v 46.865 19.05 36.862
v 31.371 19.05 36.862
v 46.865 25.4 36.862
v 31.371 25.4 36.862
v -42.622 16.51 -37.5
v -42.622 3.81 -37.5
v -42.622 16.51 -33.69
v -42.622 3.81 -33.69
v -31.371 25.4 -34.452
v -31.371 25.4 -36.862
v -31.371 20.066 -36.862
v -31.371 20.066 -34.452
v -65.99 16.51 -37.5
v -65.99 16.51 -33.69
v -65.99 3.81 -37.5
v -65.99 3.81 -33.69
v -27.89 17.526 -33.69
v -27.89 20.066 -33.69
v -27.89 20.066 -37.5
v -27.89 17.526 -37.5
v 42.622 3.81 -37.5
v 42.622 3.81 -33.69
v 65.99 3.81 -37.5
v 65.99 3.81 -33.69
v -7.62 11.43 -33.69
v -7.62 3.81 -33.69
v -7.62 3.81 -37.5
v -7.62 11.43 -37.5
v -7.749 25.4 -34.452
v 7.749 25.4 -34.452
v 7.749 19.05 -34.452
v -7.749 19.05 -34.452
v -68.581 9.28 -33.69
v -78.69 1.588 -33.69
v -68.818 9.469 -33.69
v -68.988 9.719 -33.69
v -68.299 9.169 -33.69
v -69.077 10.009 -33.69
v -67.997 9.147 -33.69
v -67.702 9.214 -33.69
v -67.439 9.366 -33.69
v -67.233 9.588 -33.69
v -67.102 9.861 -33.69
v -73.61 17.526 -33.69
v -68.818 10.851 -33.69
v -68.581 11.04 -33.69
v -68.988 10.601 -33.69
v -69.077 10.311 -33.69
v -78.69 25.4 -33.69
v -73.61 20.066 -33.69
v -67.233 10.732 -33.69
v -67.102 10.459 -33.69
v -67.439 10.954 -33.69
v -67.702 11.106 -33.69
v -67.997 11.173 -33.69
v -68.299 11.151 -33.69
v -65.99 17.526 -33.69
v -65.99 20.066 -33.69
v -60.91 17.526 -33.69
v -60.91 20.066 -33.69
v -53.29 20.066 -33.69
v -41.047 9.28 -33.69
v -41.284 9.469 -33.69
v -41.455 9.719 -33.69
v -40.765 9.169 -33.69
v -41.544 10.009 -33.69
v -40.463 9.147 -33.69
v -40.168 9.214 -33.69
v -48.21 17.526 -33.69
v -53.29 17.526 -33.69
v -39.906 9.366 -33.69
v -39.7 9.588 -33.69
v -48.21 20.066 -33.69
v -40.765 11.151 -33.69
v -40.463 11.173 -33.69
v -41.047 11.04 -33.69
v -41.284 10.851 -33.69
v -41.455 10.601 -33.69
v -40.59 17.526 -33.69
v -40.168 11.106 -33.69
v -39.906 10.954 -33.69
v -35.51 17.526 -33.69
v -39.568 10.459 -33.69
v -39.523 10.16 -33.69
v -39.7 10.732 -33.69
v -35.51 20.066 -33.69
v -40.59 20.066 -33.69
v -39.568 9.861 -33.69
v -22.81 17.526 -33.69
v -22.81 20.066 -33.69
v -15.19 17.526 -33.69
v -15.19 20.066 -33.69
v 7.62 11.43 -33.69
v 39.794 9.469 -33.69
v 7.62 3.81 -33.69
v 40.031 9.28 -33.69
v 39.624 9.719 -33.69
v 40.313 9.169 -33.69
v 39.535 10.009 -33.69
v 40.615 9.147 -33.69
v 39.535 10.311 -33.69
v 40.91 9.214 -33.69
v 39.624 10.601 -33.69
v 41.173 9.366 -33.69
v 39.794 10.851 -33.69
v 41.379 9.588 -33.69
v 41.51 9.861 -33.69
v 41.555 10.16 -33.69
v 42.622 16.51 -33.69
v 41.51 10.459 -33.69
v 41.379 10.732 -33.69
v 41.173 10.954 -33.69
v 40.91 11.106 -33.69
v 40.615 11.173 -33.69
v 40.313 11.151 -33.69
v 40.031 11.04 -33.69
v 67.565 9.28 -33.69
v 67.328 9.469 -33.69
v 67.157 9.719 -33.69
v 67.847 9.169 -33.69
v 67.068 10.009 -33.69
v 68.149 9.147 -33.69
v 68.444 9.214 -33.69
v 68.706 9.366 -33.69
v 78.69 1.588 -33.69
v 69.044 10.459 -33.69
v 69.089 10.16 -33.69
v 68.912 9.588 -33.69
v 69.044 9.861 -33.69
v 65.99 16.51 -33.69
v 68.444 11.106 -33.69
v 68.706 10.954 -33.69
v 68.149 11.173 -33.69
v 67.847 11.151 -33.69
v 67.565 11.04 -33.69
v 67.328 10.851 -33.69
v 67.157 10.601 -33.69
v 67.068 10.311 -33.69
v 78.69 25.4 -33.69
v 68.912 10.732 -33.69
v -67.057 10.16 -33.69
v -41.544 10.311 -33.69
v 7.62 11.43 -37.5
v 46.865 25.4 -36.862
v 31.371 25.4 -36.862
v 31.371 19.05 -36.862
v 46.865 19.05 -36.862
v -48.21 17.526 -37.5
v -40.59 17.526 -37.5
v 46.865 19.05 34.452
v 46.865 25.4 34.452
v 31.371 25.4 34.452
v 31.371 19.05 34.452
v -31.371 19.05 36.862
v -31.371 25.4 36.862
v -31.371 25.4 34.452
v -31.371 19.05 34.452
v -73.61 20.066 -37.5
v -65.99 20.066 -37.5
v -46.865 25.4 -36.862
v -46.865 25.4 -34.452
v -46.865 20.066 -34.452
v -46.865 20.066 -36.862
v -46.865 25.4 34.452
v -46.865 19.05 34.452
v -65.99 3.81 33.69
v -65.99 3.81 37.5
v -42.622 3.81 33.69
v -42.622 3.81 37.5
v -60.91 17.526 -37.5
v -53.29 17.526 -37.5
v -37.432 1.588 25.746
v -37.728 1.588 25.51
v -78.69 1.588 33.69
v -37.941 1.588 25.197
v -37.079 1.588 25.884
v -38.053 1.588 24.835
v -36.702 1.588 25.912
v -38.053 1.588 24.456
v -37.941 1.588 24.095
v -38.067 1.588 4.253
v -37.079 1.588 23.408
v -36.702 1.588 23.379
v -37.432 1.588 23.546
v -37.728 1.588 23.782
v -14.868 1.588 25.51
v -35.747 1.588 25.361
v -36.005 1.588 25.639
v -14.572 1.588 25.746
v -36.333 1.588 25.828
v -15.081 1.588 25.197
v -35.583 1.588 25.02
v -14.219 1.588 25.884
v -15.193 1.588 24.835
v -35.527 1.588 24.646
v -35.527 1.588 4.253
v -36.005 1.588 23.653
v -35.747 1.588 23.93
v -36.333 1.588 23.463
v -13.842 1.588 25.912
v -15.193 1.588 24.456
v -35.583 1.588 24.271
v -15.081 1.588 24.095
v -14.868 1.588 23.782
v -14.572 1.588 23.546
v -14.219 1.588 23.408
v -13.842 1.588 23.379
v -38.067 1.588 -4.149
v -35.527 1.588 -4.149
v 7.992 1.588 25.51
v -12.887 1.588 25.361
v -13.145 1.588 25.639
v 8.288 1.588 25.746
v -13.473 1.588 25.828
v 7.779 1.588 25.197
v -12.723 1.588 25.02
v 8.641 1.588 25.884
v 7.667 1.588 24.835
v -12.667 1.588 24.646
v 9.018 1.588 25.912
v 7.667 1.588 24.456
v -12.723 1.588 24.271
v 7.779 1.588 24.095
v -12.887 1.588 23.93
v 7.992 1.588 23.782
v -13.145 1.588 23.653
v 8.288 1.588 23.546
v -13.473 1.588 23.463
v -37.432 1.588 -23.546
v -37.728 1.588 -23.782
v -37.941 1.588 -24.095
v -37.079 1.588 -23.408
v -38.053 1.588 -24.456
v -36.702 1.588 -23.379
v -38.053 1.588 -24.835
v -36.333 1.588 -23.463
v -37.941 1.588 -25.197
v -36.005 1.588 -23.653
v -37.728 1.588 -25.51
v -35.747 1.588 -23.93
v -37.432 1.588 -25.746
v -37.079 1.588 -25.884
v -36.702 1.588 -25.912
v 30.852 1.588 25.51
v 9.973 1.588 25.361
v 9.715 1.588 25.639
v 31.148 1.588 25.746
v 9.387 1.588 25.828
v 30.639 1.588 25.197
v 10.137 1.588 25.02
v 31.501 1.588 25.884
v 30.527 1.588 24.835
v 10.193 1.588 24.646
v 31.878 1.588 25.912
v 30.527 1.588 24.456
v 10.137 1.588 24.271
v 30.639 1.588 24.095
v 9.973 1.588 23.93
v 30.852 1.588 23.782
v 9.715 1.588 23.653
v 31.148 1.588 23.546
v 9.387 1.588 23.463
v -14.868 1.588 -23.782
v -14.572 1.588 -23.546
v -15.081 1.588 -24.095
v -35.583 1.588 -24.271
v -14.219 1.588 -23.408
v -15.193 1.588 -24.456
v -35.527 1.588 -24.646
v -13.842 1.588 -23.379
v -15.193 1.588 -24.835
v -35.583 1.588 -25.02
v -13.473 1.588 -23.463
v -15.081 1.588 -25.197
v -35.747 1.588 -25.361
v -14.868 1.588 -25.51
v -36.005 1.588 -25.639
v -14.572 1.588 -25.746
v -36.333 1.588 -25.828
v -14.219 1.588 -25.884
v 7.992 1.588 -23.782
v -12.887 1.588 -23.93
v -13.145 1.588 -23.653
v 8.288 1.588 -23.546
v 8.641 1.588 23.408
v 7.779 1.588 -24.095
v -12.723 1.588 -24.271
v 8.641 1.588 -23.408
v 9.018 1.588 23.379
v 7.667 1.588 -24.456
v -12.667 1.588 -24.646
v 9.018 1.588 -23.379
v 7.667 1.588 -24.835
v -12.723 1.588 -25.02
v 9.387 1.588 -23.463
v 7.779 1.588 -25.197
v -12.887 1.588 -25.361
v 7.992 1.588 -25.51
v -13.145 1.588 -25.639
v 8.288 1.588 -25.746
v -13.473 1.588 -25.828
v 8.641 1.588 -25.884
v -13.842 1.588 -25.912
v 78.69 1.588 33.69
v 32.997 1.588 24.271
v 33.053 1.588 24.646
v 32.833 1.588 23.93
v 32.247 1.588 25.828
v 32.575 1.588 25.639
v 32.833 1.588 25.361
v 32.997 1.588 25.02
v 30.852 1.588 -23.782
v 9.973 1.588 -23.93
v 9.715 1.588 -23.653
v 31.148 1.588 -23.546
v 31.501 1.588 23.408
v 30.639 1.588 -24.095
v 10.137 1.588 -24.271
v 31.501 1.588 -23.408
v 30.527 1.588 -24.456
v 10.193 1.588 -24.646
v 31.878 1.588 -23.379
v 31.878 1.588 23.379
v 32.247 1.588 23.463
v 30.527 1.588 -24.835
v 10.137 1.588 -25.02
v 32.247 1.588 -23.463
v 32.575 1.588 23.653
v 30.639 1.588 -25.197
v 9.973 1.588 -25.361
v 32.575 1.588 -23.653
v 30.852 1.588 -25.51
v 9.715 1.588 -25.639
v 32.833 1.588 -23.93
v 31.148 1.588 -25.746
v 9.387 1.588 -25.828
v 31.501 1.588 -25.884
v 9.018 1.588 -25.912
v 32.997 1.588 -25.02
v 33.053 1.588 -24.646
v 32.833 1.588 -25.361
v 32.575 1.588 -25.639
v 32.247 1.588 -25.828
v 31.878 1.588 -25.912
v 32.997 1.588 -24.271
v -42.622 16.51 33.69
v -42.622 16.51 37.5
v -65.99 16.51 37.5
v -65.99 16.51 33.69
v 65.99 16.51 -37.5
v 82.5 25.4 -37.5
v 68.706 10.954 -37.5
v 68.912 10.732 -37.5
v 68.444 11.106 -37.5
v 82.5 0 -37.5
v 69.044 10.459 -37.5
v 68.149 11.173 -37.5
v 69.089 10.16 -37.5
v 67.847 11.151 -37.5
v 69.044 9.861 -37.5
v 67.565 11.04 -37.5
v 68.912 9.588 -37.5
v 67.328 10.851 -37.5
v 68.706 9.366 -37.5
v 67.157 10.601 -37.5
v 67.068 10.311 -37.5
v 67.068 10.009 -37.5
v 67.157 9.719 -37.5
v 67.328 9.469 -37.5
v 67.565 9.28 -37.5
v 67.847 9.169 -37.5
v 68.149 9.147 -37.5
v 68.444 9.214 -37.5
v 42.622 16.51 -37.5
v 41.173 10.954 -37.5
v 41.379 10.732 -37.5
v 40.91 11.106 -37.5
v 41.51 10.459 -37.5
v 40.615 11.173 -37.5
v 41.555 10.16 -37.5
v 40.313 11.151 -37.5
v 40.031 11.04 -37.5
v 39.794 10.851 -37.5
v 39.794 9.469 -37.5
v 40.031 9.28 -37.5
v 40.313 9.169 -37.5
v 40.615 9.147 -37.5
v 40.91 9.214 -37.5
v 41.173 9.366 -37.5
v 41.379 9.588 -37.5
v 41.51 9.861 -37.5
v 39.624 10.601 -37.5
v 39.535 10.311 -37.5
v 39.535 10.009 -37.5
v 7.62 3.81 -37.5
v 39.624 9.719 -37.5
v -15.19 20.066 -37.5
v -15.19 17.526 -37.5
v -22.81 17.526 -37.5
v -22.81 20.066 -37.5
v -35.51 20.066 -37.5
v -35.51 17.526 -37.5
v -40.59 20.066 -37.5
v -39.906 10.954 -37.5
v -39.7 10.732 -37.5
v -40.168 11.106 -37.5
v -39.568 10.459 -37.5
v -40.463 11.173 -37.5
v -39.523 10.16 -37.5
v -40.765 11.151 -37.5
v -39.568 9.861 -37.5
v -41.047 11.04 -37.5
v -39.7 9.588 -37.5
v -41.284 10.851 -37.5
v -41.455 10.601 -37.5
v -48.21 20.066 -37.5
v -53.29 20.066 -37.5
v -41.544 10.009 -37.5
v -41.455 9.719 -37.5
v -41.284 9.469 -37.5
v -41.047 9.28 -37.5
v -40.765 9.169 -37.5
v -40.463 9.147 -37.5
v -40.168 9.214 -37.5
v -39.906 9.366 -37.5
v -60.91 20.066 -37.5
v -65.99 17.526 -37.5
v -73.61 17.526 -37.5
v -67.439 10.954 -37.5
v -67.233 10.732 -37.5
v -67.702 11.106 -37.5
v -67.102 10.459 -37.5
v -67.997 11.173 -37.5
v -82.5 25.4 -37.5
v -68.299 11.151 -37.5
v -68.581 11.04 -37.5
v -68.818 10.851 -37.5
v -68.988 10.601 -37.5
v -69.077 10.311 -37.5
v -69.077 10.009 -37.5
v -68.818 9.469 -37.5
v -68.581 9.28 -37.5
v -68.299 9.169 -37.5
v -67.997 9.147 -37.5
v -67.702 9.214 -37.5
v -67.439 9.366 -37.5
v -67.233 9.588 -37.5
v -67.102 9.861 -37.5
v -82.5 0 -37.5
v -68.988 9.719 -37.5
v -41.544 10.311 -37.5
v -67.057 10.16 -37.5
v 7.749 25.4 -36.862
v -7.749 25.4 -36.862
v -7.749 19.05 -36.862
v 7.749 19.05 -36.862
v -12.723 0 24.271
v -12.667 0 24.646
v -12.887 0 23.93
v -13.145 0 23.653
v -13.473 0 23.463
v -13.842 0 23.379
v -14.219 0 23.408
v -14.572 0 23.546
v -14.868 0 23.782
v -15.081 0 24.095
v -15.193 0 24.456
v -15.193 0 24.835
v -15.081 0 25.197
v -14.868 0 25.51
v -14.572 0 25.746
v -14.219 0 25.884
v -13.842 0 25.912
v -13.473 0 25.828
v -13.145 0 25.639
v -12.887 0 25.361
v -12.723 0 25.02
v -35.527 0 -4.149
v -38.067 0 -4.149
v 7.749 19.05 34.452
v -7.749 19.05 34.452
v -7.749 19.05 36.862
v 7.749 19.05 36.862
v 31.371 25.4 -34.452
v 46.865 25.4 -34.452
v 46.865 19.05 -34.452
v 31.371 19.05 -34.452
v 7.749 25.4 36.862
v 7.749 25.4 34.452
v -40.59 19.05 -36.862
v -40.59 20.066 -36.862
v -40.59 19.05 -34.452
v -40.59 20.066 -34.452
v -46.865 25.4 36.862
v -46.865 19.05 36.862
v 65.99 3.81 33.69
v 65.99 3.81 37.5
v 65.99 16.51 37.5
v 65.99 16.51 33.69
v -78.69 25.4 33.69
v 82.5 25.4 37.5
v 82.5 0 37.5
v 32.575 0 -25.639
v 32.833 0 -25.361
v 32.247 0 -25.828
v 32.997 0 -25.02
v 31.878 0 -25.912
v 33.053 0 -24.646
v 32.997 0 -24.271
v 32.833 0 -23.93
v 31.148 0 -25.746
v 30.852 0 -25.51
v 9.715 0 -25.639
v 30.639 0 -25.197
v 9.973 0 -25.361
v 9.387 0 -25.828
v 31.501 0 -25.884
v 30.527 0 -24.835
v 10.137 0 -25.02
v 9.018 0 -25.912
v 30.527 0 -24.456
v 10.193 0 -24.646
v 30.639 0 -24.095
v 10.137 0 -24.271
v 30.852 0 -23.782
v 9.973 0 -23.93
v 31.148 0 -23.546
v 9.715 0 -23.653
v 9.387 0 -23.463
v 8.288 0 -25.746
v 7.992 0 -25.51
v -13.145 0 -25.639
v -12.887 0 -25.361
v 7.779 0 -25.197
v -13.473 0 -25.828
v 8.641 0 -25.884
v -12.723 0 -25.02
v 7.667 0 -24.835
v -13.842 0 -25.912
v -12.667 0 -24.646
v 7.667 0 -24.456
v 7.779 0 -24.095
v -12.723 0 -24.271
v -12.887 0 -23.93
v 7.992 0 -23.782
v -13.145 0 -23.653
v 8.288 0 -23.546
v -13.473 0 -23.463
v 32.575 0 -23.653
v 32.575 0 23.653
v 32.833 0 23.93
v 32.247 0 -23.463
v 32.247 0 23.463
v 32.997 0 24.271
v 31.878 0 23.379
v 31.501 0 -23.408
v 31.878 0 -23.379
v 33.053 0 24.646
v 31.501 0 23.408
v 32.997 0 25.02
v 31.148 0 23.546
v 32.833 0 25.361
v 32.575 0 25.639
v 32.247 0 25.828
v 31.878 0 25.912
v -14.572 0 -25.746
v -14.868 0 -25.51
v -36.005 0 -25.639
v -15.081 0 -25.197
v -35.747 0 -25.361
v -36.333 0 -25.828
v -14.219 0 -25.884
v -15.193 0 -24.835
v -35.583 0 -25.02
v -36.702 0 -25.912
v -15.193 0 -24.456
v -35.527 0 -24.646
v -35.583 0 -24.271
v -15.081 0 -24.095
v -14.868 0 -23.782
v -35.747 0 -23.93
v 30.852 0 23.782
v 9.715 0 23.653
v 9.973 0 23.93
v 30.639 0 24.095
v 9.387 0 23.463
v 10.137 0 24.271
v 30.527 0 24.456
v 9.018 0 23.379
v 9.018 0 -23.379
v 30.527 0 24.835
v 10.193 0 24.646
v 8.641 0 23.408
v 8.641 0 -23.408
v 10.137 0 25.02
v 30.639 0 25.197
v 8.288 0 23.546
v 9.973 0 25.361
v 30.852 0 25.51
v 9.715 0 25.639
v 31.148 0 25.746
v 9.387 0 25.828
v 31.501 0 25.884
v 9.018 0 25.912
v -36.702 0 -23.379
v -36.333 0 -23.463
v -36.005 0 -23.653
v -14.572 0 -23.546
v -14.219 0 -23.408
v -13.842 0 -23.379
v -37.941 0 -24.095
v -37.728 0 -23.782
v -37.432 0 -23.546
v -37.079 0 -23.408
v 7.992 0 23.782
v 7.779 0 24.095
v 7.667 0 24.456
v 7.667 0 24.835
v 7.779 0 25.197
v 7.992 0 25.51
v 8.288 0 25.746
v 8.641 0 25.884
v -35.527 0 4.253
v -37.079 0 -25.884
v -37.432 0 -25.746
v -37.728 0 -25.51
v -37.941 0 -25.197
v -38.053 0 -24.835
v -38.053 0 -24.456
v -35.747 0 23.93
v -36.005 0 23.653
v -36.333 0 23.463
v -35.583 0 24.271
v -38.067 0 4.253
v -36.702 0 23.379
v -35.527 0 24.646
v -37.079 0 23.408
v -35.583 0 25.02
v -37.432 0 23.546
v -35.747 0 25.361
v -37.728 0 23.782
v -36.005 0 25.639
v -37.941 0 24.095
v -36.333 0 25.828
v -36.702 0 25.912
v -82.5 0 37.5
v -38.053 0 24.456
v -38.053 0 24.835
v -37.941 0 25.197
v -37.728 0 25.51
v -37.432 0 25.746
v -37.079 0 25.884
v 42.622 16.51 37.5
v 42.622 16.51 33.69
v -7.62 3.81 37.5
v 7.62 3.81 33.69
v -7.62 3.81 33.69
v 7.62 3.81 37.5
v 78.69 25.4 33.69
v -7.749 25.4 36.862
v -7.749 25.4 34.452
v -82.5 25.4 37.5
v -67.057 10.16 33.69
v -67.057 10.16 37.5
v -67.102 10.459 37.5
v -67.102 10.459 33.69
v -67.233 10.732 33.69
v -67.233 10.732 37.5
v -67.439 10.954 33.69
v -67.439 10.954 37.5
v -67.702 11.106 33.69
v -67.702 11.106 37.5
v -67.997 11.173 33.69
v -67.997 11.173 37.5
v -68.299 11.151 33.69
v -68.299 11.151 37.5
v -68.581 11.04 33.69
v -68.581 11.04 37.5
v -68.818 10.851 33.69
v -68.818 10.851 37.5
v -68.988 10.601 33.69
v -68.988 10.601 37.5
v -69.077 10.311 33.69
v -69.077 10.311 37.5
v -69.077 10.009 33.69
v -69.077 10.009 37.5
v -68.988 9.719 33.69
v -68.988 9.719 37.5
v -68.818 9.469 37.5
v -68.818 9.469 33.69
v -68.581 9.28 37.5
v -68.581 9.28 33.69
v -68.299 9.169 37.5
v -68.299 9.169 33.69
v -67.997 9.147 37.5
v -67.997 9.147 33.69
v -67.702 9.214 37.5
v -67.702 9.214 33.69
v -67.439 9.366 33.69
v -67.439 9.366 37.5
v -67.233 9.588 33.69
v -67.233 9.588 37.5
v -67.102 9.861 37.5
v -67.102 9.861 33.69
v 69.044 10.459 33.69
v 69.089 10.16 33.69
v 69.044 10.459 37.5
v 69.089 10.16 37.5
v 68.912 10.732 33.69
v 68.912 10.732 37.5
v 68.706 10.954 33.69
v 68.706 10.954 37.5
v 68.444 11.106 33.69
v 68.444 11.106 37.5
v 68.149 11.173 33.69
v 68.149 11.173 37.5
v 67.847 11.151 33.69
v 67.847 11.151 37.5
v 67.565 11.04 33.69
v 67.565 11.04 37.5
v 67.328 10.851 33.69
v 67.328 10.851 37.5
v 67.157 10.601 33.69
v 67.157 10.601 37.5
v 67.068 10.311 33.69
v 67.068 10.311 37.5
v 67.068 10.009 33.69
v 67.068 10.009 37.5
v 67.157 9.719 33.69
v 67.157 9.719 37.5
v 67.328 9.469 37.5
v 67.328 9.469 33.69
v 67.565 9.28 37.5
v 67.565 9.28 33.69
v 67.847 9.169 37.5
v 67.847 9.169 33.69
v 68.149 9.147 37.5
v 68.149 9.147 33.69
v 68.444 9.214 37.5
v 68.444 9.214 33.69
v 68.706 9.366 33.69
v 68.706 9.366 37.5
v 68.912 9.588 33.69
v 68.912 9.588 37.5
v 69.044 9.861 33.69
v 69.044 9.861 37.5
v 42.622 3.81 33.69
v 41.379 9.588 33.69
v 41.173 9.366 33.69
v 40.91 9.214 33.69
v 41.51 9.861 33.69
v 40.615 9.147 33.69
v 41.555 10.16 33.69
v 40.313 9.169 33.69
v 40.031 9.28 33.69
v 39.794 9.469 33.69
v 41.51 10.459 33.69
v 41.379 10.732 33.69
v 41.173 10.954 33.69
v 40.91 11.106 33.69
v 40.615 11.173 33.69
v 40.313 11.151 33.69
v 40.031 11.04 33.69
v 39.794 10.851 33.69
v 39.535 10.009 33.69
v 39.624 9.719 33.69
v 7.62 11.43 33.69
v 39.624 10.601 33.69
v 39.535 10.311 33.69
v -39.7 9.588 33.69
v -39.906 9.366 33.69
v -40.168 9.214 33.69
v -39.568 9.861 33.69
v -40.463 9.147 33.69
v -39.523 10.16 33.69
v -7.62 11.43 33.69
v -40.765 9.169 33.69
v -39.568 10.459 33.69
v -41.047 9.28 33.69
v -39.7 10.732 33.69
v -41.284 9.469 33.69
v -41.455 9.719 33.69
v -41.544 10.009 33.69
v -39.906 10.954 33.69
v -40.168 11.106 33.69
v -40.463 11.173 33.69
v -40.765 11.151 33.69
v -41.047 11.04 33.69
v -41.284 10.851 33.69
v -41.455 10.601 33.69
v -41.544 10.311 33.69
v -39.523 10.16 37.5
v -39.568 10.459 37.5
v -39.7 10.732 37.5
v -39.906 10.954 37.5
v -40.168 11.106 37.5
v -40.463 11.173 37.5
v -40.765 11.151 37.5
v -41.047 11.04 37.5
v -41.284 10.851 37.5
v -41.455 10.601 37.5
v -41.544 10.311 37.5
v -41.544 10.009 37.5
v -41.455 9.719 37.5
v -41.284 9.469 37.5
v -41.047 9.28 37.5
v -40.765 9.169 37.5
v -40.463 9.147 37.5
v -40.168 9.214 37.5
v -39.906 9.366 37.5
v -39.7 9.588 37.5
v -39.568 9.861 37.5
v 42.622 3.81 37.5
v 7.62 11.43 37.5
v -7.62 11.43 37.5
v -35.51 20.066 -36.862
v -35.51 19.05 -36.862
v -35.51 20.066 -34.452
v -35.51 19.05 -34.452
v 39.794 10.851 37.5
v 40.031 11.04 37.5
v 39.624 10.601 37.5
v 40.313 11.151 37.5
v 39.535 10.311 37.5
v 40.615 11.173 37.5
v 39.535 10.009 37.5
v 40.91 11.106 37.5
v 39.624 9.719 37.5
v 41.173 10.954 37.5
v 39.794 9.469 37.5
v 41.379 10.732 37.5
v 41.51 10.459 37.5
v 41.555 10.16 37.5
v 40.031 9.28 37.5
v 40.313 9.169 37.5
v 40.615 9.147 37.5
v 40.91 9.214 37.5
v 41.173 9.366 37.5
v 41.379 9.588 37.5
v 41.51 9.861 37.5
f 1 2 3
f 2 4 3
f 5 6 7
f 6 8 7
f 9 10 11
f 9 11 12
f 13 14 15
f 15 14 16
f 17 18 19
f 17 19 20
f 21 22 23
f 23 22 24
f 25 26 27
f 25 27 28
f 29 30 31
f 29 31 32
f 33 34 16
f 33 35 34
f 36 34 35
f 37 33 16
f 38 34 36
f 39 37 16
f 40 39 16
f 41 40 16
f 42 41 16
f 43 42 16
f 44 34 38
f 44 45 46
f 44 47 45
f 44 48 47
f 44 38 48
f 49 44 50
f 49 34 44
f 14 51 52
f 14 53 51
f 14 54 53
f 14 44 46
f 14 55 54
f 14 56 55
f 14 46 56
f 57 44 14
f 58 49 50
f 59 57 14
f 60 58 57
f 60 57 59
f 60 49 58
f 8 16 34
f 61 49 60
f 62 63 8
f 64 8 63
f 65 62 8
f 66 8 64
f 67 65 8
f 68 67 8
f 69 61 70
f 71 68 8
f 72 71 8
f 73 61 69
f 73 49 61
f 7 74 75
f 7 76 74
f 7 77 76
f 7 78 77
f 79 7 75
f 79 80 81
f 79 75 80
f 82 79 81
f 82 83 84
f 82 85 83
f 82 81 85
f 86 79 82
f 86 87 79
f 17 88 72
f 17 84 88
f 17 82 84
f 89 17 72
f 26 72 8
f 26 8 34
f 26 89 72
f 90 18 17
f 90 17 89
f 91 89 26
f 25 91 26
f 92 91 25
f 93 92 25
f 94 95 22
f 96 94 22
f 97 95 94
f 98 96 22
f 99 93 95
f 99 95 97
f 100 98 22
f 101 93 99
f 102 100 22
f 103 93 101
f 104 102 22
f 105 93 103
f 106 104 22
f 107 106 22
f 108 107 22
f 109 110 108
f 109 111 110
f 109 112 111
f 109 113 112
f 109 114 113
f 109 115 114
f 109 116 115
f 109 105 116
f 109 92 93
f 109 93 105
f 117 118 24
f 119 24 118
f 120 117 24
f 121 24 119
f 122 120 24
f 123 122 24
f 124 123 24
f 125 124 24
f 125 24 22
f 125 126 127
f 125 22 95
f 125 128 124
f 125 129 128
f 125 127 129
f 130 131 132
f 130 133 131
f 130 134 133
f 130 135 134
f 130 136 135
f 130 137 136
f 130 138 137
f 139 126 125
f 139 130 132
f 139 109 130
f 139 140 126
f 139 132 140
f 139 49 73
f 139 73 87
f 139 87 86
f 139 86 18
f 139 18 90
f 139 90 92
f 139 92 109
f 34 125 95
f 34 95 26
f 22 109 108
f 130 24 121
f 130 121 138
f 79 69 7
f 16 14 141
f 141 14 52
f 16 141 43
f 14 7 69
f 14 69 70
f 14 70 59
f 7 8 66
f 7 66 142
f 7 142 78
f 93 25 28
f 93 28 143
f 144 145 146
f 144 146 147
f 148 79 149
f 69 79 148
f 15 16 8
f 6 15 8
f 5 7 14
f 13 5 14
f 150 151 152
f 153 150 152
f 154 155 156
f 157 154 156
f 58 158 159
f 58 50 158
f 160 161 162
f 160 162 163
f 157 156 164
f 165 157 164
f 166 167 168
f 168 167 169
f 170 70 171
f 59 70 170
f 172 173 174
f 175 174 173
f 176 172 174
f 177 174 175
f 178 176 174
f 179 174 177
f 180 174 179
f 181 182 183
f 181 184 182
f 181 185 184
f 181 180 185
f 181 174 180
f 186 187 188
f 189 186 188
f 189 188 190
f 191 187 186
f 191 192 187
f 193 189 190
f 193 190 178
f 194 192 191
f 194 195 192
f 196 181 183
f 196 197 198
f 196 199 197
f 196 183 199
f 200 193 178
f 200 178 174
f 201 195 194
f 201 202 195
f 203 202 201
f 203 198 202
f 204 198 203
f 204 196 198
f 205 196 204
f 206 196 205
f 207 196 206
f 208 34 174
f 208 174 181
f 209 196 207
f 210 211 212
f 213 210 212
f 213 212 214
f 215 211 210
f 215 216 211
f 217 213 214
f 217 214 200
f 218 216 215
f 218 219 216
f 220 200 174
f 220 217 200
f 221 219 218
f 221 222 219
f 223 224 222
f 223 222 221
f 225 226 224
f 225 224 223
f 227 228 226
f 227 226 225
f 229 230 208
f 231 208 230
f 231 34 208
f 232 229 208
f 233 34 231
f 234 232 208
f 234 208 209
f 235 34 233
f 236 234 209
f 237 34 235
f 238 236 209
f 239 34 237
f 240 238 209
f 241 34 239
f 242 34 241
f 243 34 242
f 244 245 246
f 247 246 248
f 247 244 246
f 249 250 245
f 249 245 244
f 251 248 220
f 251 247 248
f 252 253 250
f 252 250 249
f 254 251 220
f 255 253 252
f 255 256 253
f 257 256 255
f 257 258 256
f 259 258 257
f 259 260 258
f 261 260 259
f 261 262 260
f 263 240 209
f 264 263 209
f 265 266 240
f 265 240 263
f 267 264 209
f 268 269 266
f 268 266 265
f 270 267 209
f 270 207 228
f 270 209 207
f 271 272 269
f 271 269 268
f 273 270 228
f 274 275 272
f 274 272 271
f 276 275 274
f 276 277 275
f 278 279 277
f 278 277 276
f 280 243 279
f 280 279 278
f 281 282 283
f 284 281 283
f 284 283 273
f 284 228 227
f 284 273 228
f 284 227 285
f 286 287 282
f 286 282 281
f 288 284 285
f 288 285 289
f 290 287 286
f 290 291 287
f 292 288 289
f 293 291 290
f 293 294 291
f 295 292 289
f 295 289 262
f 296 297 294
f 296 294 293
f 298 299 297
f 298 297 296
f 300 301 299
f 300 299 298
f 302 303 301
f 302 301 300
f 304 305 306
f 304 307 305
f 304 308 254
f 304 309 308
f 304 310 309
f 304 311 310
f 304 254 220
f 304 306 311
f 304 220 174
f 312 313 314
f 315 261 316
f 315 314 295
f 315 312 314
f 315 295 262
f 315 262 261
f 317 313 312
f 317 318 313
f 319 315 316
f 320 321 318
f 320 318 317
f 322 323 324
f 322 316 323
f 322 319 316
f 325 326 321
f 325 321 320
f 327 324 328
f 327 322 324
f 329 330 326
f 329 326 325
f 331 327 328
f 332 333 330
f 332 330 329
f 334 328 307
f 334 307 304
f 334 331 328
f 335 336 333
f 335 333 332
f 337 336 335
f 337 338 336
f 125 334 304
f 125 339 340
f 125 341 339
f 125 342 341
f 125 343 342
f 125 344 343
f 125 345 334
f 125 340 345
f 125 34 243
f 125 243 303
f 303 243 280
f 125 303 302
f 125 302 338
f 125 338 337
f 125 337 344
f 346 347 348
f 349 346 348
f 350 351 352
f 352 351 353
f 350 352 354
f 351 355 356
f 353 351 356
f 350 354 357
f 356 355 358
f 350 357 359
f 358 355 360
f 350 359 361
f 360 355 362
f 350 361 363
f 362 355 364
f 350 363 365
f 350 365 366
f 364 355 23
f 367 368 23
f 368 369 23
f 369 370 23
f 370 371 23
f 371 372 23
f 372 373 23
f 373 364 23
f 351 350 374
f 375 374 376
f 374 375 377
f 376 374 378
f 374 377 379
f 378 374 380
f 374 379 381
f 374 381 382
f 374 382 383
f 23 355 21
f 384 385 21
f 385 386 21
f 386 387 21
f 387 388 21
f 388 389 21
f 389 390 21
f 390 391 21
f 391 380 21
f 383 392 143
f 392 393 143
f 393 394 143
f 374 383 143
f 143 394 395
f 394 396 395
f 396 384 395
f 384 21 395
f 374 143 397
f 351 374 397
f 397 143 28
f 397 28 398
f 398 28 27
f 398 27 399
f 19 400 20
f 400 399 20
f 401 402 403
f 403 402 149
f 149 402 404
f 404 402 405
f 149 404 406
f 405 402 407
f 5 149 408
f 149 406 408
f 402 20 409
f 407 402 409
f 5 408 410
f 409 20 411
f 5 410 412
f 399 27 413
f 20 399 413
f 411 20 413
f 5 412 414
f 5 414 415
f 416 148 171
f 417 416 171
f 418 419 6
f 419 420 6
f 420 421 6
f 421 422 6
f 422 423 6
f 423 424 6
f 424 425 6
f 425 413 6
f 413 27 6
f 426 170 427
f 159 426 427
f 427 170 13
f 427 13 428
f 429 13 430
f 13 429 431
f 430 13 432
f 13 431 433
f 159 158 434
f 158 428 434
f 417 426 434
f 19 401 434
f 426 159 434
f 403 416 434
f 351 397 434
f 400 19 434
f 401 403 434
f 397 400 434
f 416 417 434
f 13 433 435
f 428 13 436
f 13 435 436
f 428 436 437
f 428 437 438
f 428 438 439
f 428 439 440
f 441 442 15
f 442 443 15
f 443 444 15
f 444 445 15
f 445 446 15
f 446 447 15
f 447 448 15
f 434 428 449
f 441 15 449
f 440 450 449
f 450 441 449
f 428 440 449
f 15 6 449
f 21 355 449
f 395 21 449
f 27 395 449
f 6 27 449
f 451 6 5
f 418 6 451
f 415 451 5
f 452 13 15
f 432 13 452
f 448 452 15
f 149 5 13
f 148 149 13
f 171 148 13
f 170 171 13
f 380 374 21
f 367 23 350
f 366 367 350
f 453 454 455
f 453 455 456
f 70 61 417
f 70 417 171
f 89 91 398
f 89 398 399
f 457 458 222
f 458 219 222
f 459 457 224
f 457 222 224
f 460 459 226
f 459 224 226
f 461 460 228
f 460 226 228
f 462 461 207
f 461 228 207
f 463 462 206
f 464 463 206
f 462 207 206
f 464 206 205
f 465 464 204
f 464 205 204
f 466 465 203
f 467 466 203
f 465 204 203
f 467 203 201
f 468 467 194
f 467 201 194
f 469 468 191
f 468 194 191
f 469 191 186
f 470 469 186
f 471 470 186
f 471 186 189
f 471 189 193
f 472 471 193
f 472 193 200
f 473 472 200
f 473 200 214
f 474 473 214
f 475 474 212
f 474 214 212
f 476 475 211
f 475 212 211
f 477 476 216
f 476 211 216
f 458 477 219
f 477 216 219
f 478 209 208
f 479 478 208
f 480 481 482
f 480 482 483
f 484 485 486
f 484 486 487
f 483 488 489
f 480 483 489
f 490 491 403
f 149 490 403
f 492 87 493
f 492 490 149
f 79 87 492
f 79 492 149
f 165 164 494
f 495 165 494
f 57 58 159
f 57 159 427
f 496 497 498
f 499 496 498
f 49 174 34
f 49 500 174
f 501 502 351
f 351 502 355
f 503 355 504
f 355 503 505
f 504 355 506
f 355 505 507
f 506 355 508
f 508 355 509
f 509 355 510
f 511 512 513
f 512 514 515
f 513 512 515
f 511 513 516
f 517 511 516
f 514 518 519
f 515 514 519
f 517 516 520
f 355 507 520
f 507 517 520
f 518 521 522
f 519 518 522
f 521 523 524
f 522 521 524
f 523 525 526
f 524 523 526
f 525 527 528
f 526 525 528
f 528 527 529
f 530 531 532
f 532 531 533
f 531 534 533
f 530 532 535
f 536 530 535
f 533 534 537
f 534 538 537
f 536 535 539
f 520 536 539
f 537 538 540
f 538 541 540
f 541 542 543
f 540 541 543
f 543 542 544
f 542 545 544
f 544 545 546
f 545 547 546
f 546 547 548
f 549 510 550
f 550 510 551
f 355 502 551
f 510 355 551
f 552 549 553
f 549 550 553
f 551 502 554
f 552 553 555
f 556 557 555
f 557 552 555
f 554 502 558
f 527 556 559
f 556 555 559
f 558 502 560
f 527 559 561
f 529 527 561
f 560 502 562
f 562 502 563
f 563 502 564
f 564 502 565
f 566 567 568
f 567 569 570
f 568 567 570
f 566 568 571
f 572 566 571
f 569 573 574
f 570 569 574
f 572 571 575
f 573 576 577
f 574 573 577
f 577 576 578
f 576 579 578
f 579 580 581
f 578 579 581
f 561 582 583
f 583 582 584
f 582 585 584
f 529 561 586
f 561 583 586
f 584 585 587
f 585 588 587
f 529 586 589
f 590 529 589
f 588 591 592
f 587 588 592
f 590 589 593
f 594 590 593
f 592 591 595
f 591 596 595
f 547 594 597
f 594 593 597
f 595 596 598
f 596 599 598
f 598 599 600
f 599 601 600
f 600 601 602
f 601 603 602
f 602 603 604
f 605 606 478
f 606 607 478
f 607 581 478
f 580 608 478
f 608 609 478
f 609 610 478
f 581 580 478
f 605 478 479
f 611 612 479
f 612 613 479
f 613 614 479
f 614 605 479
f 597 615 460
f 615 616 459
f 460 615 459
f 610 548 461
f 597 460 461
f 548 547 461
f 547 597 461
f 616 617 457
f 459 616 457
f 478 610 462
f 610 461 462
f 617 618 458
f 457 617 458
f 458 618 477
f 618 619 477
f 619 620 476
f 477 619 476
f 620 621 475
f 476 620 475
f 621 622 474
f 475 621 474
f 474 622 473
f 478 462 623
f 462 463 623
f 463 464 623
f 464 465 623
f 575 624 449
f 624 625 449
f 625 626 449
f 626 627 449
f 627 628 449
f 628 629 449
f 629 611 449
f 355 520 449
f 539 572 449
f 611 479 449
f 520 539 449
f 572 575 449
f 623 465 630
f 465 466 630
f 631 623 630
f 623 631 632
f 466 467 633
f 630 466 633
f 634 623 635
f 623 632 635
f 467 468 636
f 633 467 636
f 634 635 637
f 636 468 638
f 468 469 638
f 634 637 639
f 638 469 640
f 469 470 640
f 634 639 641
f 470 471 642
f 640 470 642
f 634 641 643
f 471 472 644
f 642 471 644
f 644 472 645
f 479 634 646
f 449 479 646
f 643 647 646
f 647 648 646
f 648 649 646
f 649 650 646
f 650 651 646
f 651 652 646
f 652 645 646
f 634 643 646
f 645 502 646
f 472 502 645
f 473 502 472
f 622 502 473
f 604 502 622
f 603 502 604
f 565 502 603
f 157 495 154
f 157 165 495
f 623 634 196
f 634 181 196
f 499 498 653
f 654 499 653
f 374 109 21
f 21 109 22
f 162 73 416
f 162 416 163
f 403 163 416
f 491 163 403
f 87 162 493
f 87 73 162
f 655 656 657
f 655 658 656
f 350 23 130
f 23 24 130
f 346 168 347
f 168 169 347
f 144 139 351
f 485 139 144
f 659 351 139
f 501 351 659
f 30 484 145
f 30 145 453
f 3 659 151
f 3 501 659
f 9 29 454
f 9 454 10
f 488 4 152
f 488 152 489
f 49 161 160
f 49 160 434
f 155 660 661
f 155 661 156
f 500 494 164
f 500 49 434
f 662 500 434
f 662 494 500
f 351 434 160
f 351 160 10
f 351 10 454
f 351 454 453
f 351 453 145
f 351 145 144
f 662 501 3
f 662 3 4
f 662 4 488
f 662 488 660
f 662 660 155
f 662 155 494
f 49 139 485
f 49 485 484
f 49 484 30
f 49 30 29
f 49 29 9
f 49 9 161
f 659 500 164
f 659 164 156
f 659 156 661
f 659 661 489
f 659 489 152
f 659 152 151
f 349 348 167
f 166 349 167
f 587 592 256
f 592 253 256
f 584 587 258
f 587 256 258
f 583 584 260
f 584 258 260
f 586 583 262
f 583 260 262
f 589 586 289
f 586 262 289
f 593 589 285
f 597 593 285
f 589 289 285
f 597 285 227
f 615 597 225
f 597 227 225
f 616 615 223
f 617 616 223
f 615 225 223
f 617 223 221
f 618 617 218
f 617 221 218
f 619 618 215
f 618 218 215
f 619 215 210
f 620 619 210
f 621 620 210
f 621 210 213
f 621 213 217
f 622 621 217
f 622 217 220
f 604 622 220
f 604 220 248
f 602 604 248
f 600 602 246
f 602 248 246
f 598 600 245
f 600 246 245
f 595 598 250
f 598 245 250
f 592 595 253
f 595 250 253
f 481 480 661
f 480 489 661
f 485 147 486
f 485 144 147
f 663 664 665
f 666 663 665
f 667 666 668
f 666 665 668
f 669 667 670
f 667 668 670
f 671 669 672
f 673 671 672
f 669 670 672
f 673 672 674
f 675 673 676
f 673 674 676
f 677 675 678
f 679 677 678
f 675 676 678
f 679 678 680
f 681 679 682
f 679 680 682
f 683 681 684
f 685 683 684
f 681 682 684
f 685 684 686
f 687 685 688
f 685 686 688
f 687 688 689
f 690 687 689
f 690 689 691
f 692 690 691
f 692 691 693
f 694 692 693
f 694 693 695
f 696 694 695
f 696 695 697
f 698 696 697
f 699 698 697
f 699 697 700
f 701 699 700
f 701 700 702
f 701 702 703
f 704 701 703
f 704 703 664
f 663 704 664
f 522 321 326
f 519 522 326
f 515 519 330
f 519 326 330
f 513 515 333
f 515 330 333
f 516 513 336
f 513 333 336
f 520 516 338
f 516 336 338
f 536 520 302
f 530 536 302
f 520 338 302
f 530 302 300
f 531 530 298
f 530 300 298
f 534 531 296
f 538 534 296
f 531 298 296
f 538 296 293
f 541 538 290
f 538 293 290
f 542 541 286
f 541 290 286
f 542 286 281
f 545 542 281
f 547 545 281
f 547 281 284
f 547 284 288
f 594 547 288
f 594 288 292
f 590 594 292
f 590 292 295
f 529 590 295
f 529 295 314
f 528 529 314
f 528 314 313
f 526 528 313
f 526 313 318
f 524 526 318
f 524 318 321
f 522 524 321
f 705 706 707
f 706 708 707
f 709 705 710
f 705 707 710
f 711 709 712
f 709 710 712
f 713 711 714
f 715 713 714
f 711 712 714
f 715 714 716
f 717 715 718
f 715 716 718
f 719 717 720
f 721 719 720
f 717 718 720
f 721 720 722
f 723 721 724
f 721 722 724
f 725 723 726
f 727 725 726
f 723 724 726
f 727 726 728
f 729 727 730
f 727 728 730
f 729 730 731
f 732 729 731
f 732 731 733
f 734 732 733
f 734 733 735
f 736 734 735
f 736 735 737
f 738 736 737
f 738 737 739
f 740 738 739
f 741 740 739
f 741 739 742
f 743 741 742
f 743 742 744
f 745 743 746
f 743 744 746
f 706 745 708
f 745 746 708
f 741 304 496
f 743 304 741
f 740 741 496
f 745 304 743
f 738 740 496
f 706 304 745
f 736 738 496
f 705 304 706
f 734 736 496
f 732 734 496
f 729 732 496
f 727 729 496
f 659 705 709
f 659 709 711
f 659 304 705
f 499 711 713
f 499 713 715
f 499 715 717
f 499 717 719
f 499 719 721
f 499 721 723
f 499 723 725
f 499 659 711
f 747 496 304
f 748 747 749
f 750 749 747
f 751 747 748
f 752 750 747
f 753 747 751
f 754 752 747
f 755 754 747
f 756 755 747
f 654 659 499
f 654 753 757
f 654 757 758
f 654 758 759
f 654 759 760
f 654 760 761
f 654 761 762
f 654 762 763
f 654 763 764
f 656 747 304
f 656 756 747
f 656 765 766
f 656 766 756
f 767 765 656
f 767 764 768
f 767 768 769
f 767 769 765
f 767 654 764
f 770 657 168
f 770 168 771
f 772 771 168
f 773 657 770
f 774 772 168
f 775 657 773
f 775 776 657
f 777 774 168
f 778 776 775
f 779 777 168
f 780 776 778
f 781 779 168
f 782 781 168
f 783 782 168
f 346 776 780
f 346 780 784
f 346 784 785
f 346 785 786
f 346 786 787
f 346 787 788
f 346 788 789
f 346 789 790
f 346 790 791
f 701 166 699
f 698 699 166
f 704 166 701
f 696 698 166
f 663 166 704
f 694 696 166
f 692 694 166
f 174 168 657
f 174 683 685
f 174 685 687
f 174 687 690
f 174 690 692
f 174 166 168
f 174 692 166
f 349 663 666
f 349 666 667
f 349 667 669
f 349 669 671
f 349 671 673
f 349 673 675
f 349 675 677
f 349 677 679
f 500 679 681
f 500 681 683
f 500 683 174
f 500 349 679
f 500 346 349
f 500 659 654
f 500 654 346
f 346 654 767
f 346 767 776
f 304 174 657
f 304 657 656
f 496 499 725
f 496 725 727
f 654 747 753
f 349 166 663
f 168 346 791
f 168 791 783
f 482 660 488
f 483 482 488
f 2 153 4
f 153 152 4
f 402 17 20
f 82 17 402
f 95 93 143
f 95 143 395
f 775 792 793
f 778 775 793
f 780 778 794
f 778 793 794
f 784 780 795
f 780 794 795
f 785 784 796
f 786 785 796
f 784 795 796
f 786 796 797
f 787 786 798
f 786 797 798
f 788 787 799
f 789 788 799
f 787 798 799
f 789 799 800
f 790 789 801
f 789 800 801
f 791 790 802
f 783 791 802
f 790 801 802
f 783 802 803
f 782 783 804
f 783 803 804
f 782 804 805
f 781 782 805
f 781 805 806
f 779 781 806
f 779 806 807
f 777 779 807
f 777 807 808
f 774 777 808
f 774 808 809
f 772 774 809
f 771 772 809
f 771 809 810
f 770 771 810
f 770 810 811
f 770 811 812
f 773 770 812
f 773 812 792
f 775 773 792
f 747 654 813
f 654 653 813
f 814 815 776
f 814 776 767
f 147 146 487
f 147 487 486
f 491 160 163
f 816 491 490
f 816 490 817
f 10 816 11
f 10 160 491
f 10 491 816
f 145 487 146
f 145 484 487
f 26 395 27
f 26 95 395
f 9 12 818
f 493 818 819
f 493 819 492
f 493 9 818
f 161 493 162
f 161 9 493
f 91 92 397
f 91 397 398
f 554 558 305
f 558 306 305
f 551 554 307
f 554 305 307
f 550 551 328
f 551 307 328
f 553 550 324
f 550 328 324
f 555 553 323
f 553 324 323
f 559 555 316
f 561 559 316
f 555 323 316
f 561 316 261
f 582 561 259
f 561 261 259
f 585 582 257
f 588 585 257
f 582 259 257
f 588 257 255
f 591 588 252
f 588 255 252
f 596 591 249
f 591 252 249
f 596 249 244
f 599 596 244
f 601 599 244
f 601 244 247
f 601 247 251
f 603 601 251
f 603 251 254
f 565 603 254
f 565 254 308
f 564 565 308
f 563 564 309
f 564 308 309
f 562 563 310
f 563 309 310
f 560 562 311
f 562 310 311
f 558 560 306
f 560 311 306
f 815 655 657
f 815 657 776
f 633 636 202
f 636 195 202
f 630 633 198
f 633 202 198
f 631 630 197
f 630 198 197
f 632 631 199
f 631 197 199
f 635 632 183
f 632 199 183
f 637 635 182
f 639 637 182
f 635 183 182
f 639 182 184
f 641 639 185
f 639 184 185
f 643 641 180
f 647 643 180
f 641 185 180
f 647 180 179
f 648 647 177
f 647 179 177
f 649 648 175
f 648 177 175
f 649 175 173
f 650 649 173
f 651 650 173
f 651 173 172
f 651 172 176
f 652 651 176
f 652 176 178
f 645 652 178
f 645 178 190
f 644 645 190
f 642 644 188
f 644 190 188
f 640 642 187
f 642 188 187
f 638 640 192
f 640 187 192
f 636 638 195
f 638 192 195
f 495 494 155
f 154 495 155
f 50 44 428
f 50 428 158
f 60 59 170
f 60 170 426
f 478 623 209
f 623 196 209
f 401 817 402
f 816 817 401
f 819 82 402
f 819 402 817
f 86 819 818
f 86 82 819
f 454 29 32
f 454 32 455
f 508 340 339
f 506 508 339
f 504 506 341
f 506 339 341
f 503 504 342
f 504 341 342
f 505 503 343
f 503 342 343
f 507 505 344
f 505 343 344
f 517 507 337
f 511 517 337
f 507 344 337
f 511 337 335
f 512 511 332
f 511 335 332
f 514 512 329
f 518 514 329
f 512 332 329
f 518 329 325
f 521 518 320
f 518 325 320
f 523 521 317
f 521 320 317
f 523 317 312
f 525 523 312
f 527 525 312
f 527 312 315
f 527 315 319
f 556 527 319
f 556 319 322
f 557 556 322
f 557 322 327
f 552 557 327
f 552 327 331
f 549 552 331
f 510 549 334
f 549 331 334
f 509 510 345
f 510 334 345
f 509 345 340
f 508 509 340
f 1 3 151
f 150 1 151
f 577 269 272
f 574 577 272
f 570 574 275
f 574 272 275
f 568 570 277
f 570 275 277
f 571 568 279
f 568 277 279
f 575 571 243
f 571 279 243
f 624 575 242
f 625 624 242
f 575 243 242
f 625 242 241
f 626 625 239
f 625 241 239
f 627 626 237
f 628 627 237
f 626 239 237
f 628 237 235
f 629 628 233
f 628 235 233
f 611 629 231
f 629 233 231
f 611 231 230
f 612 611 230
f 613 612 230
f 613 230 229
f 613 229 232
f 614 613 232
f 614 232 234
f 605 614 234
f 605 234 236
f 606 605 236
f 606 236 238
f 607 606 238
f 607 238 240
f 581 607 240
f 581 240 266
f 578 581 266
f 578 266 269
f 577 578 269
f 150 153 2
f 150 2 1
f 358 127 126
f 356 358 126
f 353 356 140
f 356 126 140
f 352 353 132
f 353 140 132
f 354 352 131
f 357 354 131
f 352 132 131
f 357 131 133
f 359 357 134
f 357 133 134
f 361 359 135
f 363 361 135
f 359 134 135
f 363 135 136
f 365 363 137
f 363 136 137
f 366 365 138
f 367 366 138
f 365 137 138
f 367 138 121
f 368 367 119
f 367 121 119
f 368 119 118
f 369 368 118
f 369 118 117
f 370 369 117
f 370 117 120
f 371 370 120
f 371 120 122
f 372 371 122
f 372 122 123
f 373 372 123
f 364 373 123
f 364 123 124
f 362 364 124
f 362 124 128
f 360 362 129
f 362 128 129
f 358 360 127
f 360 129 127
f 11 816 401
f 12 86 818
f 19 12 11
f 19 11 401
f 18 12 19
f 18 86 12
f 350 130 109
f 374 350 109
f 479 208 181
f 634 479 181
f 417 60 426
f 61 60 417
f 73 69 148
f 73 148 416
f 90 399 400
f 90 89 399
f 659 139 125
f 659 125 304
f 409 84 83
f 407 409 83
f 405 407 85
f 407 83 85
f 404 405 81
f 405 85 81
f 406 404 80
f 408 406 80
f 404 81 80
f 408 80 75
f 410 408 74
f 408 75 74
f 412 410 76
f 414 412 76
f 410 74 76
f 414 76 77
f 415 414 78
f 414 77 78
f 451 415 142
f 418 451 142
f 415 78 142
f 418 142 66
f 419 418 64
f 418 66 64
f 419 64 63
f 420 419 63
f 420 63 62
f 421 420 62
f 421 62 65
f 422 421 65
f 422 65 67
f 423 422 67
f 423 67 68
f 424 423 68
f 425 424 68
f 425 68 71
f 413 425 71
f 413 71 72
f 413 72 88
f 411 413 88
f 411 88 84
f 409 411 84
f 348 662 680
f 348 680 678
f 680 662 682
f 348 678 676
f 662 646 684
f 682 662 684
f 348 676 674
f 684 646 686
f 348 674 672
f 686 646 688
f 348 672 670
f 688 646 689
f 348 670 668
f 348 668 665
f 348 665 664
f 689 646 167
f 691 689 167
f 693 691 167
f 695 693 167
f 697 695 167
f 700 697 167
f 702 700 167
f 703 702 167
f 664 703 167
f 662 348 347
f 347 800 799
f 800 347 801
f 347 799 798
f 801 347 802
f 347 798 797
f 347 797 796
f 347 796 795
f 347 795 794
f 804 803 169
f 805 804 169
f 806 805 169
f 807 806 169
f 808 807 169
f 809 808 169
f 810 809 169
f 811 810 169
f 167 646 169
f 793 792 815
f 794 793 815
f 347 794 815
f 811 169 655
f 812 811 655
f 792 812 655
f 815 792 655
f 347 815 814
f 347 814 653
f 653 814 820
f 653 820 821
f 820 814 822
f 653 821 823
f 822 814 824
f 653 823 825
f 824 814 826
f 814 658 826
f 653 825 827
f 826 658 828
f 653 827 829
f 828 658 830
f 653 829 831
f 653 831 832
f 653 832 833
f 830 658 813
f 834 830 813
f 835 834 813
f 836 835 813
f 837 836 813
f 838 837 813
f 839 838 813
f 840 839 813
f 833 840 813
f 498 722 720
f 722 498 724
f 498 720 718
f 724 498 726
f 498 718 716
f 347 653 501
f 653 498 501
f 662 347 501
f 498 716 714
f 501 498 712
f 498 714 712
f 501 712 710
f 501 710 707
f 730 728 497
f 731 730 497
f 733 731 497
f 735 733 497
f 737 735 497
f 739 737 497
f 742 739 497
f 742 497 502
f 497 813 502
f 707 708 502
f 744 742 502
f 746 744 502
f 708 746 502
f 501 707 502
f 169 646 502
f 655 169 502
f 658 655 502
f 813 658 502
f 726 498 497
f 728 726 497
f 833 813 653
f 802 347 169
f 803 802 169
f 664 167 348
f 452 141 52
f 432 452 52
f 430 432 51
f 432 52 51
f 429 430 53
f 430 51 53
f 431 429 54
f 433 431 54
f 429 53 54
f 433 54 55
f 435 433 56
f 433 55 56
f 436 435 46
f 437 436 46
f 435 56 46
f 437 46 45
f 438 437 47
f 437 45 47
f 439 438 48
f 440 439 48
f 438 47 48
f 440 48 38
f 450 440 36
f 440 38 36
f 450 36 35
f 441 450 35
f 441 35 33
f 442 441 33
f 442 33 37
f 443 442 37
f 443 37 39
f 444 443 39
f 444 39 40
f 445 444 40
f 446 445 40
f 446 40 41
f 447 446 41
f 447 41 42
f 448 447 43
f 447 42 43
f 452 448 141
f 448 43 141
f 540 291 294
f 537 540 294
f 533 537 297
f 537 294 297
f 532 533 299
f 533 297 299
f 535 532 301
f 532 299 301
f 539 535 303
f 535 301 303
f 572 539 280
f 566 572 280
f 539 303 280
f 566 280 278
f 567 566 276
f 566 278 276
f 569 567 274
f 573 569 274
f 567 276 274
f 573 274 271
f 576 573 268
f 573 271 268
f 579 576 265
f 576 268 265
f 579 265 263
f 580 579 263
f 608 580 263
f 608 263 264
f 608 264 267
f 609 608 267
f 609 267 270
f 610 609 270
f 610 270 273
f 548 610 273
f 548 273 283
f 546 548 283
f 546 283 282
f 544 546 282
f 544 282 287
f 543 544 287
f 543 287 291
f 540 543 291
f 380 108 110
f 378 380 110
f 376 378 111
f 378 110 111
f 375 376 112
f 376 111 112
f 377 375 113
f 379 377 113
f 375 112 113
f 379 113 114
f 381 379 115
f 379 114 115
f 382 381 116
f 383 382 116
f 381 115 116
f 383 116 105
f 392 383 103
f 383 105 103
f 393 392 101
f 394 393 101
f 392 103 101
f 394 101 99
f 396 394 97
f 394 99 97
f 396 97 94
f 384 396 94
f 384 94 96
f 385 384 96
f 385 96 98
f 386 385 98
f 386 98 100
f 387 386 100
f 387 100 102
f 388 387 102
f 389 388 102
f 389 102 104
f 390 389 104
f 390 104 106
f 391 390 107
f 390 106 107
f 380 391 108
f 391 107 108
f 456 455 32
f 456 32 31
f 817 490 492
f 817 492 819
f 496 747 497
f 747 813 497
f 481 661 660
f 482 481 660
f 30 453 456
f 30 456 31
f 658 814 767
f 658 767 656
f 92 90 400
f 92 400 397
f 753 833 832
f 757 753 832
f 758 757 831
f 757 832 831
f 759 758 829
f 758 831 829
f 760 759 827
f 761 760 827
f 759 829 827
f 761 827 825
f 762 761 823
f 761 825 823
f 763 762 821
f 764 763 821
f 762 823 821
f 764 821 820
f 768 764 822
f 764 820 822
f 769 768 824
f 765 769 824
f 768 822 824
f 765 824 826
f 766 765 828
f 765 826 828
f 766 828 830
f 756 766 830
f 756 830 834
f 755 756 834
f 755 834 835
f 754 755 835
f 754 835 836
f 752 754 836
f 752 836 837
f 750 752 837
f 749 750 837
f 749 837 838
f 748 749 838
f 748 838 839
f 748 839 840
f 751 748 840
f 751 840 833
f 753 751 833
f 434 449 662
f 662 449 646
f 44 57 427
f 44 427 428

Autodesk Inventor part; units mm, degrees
ref_plane "YZ Plane" through (0, 0, 0) normal (1, 0, 0) x (0, 1, 0)
ref_plane "XZ Plane" through (0, 0, 0) normal (0, 1, 0) x (-1, 0, 0)
sketch "Sketch1" plane through (0, 0, 0) normal (0, 1, 0) x (-1, 0, 0)
  line L0 (82.5, 37.5) -> (-82.5, 37.5)
  line L1 (-82.5, 37.5) -> (-82.5, -37.5)
  line L2 (-82.5, -37.5) -> (82.5, -37.5)
  line L3 (82.5, -37.5) -> (82.5, 37.5)
  point P0 (0, 0)
  point P1 (82.5, 0)
  point P2 (0, -37.5)
  dimension "d0" = 165
  dimension "d1" = 75
extrude "Extrusion1" add sketch "Sketch1" along normal blind 25.4
sketch "Sketch2" plane through (-82.5, 0, 37.5) normal (0, 0, 1) x (1, 0, 0)
  line L0 (39.878, 16.51) -> (16.51, 16.51)
  line L1 (39.878, 3.81) -> (39.878, 16.51)
  line L2 (16.51, 3.81) -> (39.878, 3.81)
  line L3 (16.51, 16.51) -> (16.51, 3.81)
  circle A0 centre (14.4272, 10.16) radius 1.016
  circle A1 centre (41.9608, 10.16) radius 1.016
  line L4 (0, 0) -> (165, 0) projected
  line L5 (0, 0) -> (0, 25.4) projected
  line L6 (148.49, 16.51) -> (125.122, 16.51)
  circle A2 centre (150.5728, 10.16) radius 1.016
  line L7 (148.49, 3.81) -> (148.49, 16.51)
  line L8 (125.122, 3.81) -> (148.49, 3.81)
  line L9 (125.122, 16.51) -> (125.122, 3.81)
  circle A3 centre (123.0392, 10.16) radius 1.016
  line L10 (165, 0) -> (165, 25.4) projected
  line L11 (74.88, 11.43) -> (90.12, 11.43)
  line L12 (90.12, 11.43) -> (90.12, 3.81)
  line L13 (90.12, 3.81) -> (74.88, 3.81)
  line L14 (74.88, 3.81) -> (74.88, 11.43)
  point P0 (82.5, 0)
  point P1 (16.51, 10.16)
  point P2 (39.878, 10.16)
  point P3 (0, 12.7)
  point P4 (125.122, 10.16)
  point P5 (82.5, 11.43)
  point P6 (82.5, 0)
  point P7 (74.88, 7.62)
  point P8 (148.49, 10.16)
  point P9 (90.12, 7.62)
  dimension "d4" = 12.7
  dimension "d5" = 23.368
  dimension "d6" = 2.032
  dimension "d7" = 2.032
  dimension "d8" = 2.0828
  dimension "d9" = 2.0828
  dimension "d11" = 16.51
  dimension "d12" = 12.7
  dimension "d13" = 23.368
  dimension "d14" = 2.032
  dimension "d15" = 2.032
  dimension "d16" = 2.0828
  dimension "d17" = 2.0828
  dimension "d18" = 16.51
  dimension "d19" = 15.24
  dimension "d20" = 7.62
  dimension "d55" = 10.16
  dimension "d56" = 10.16
  dimension "d58" = 7.62
extrude "Extrusion2" cut sketch "Sketch2" against normal blind 100.0125
sketch "Sketch3" plane through (0, 25.4, 0) normal (0, 1, 0) x (1, 0, 0)
  line L0 (-78.69, 33.69) -> (78.69, 33.69)
  line L1 (78.69, 33.69) -> (78.69, -33.69)
  line L2 (78.69, -33.69) -> (-78.69, -33.69)
  line L3 (-78.69, -33.69) -> (-78.69, 33.69)
  line L4 (82.5, -37.5) -> (82.5, 37.5) projected
  line L5 (-82.5, 37.5) -> (-82.5, -37.5) projected
  line L6 (82.5, 37.5) -> (-82.5, 37.5) projected
  line L7 (-82.5, -37.5) -> (82.5, -37.5) projected
  point P0 (0, 0)
  dimension "d25" = 3.81
  dimension "d26" = 3.81
  dimension "d27" = 3.81
  dimension "d28" = 3.81
extrude "Extrusion3" cut sketch "Sketch3" against normal blind 23.8125 contours L0 L1 L2 L3
sketch "Sketch4" plane through (0, 1.5875, 0) normal (0, 1, 0) x (1, 0, 0)
  circle A0 centre (31.7833, 24.6457) radius 1.27
  line L0 (-42.5, 20.5817) -> (42.5, 20.5817)
  circle A1 centre (8.9233, 24.6457) radius 1.27
  circle A2 centre (-13.9367, 24.6457) radius 1.27
  circle A3 centre (-36.7967, 24.6457) radius 1.27
  line L1 (67.3028, 0) -> (-67.3028, 0)
  circle A4 centre (31.7833, -24.6457) radius 1.27
  circle A5 centre (8.9233, -24.6457) radius 1.27
  circle A6 centre (-13.9367, -24.6457) radius 1.27
  circle A7 centre (-36.7967, -24.6457) radius 1.27
  line L2 (78.69, 33.69) -> (78.69, -33.69) projected
  line L3 (-38.0667, -4.2532) -> (-35.5267, -4.2532)
  line L4 (-35.5267, -4.2532) -> (-35.5267, 4.1493)
  line L5 (-35.5267, 4.1493) -> (-38.0667, 4.1493)
  line L6 (-38.0667, 4.1493) -> (-38.0667, -4.2532)
  point P0 (0, 0)
  point P1 (-11.4746, -1.9183)
  point P2 (78.69, 0)
  point P3 (0, 0)
  point P4 (0, 20.5817)
  point P5 (-36.7967, -4.2532)
  dimension "d35" = 2.54
  dimension "d36" = 4.064
  dimension "d37" = 22.86
  dimension "d159" = 20.3925
  dimension "d160" = 49.2914
extrude "Extrusion4" cut sketch "Sketch4" against normal blind 22.225
ref_plane "Work Plane2" through (0, 19.05, 0) normal (0, 1, 0) x (1, 0, 0)
sketch "Sketch9" plane through (0, 25.4, 0) normal (0, 1, 0) x (1, 0, 0)
  line L0 (-46.8649, 36.8624) -> (-31.3709, 36.8624)
  line L1 (-31.3709, 36.8624) -> (-31.3709, 34.452)
  line L2 (-31.3709, 34.452) -> (-46.8649, 34.452)
  line L3 (-46.8649, 34.452) -> (-46.8649, 36.8624)
  line L4 (31.3709, 36.8624) -> (46.8649, 36.8624)
  line L5 (46.8649, 36.8624) -> (46.8649, 34.452)
  line L6 (46.8649, 34.452) -> (31.3709, 34.452)
  line L7 (31.3709, 34.452) -> (31.3709, 36.8624)
  line L8 (-7.7489, 36.8624) -> (7.7489, 36.8624)
  line L9 (7.7489, 36.8624) -> (7.7489, 34.452)
  line L10 (7.7489, 34.452) -> (-7.7489, 34.452)
  line L11 (-7.7489, 34.452) -> (-7.7489, 36.8624)
  line L12 (82.5, -37.5) -> (82.5, 37.5) projected
  line L13 (-82.5, 37.5) -> (-82.5, -37.5) projected
  line L14 (-67.8534, 0) -> (73.4776, 0)
  line L15 (-46.8649, -36.8624) -> (-31.3709, -36.8624)
  line L16 (-31.3709, -36.8624) -> (-31.3709, -34.452)
  line L17 (-31.3709, -34.452) -> (-46.8649, -34.452)
  line L18 (-46.8649, -34.452) -> (-46.8649, -36.8624)
  line L19 (31.3709, -36.8624) -> (46.8649, -36.8624)
  line L20 (46.8649, -36.8624) -> (46.8649, -34.452)
  line L21 (46.8649, -34.452) -> (31.3709, -34.452)
  line L22 (31.3709, -34.452) -> (31.3709, -36.8624)
  line L23 (-7.7489, -36.8624) -> (7.7489, -36.8624)
  line L24 (7.7489, -36.8624) -> (7.7489, -34.452)
  line L25 (7.7489, -34.452) -> (-7.7489, -34.452)
  line L26 (-7.7489, -34.452) -> (-7.7489, -36.8624)
  line L27 (-78.69, 33.69) -> (78.69, 33.69) projected
  point P0 (0, 0)
  point P1 (-31.3709, 35.6572)
  point P2 (31.3709, 35.6572)
  point P3 (-7.7489, 35.6572)
  point P4 (7.7489, 35.6572)
  point P5 (0, 34.452)
  dimension "d59" = 2.4104
  dimension "d60" = 2.4104
  dimension "d61" = 2.4104
  dimension "d62" = 23.622
  dimension "d63" = 23.622
  dimension "d64" = 15.4979
  dimension "d65" = 15.494
  dimension "d66" = 15.494
  dimension "d85" = 0.762
extrude "Extrusion6" cut sketch "Sketch9" against normal blind 6.35
sketch "Sketch12" plane through (-78.69, 25.4, -33.69) normal (0, 0, 1) x (1, 0, 0)
  line L0 (5.08, -5.334) -> (12.7, -5.334)
  line L1 (12.7, -5.334) -> (12.7, -7.874)
  line L2 (12.7, -7.874) -> (5.08, -7.874)
  line L3 (5.08, -7.874) -> (5.08, -5.334)
  line L4 (0, 0) -> (157.38, 0) projected
  line L5 (0, 0) -> (0, -23.8125) projected
  line L6 (17.78, -5.334) -> (25.4, -5.334)
  line L7 (25.4, -5.334) -> (25.4, -7.874)
  line L8 (25.4, -7.874) -> (17.78, -7.874)
  line L9 (17.78, -7.874) -> (17.78, -5.334)
  line L10 (30.48, -5.334) -> (38.1, -5.334)
  line L11 (38.1, -5.334) -> (38.1, -7.874)
  line L12 (38.1, -7.874) -> (30.48, -7.874)
  line L13 (30.48, -7.874) -> (30.48, -5.334)
  line L14 (43.18, -5.334) -> (50.8, -5.334)
  line L15 (50.8, -5.334) -> (50.8, -7.874)
  line L16 (50.8, -7.874) -> (43.18, -7.874)
  line L17 (43.18, -7.874) -> (43.18, -5.334)
  line L18 (55.88, -5.334) -> (63.5, -5.334)
  line L19 (63.5, -5.334) -> (63.5, -7.874)
  line L20 (63.5, -7.874) -> (55.88, -7.874)
  line L21 (55.88, -7.874) -> (55.88, -5.334)
  point P0 (78.69, -25.4)
  dimension "d123" = 2.54
  dimension "d124" = 7.62
  dimension "d125" = 5.334
  dimension "d126" = 5.08
  dimension "d127" = 7.62
  dimension "d128" = 2.54
  dimension "d129" = 5.334
  dimension "d130" = 5.08
  dimension "d131" = 7.62
  dimension "d132" = 2.54
  dimension "d133" = 5.334
  dimension "d134" = 5.08
  dimension "d135" = 7.62
  dimension "d136" = 2.54
  dimension "d137" = 5.334
  dimension "d138" = 5.08
  dimension "d139" = 7.62
  dimension "d140" = 2.54
  dimension "d141" = 5.334
  dimension "d142" = 5.08
extrude "Extrusion9" cut sketch "Sketch12" against normal blind 5.715
properties part number "cuerpo3"
